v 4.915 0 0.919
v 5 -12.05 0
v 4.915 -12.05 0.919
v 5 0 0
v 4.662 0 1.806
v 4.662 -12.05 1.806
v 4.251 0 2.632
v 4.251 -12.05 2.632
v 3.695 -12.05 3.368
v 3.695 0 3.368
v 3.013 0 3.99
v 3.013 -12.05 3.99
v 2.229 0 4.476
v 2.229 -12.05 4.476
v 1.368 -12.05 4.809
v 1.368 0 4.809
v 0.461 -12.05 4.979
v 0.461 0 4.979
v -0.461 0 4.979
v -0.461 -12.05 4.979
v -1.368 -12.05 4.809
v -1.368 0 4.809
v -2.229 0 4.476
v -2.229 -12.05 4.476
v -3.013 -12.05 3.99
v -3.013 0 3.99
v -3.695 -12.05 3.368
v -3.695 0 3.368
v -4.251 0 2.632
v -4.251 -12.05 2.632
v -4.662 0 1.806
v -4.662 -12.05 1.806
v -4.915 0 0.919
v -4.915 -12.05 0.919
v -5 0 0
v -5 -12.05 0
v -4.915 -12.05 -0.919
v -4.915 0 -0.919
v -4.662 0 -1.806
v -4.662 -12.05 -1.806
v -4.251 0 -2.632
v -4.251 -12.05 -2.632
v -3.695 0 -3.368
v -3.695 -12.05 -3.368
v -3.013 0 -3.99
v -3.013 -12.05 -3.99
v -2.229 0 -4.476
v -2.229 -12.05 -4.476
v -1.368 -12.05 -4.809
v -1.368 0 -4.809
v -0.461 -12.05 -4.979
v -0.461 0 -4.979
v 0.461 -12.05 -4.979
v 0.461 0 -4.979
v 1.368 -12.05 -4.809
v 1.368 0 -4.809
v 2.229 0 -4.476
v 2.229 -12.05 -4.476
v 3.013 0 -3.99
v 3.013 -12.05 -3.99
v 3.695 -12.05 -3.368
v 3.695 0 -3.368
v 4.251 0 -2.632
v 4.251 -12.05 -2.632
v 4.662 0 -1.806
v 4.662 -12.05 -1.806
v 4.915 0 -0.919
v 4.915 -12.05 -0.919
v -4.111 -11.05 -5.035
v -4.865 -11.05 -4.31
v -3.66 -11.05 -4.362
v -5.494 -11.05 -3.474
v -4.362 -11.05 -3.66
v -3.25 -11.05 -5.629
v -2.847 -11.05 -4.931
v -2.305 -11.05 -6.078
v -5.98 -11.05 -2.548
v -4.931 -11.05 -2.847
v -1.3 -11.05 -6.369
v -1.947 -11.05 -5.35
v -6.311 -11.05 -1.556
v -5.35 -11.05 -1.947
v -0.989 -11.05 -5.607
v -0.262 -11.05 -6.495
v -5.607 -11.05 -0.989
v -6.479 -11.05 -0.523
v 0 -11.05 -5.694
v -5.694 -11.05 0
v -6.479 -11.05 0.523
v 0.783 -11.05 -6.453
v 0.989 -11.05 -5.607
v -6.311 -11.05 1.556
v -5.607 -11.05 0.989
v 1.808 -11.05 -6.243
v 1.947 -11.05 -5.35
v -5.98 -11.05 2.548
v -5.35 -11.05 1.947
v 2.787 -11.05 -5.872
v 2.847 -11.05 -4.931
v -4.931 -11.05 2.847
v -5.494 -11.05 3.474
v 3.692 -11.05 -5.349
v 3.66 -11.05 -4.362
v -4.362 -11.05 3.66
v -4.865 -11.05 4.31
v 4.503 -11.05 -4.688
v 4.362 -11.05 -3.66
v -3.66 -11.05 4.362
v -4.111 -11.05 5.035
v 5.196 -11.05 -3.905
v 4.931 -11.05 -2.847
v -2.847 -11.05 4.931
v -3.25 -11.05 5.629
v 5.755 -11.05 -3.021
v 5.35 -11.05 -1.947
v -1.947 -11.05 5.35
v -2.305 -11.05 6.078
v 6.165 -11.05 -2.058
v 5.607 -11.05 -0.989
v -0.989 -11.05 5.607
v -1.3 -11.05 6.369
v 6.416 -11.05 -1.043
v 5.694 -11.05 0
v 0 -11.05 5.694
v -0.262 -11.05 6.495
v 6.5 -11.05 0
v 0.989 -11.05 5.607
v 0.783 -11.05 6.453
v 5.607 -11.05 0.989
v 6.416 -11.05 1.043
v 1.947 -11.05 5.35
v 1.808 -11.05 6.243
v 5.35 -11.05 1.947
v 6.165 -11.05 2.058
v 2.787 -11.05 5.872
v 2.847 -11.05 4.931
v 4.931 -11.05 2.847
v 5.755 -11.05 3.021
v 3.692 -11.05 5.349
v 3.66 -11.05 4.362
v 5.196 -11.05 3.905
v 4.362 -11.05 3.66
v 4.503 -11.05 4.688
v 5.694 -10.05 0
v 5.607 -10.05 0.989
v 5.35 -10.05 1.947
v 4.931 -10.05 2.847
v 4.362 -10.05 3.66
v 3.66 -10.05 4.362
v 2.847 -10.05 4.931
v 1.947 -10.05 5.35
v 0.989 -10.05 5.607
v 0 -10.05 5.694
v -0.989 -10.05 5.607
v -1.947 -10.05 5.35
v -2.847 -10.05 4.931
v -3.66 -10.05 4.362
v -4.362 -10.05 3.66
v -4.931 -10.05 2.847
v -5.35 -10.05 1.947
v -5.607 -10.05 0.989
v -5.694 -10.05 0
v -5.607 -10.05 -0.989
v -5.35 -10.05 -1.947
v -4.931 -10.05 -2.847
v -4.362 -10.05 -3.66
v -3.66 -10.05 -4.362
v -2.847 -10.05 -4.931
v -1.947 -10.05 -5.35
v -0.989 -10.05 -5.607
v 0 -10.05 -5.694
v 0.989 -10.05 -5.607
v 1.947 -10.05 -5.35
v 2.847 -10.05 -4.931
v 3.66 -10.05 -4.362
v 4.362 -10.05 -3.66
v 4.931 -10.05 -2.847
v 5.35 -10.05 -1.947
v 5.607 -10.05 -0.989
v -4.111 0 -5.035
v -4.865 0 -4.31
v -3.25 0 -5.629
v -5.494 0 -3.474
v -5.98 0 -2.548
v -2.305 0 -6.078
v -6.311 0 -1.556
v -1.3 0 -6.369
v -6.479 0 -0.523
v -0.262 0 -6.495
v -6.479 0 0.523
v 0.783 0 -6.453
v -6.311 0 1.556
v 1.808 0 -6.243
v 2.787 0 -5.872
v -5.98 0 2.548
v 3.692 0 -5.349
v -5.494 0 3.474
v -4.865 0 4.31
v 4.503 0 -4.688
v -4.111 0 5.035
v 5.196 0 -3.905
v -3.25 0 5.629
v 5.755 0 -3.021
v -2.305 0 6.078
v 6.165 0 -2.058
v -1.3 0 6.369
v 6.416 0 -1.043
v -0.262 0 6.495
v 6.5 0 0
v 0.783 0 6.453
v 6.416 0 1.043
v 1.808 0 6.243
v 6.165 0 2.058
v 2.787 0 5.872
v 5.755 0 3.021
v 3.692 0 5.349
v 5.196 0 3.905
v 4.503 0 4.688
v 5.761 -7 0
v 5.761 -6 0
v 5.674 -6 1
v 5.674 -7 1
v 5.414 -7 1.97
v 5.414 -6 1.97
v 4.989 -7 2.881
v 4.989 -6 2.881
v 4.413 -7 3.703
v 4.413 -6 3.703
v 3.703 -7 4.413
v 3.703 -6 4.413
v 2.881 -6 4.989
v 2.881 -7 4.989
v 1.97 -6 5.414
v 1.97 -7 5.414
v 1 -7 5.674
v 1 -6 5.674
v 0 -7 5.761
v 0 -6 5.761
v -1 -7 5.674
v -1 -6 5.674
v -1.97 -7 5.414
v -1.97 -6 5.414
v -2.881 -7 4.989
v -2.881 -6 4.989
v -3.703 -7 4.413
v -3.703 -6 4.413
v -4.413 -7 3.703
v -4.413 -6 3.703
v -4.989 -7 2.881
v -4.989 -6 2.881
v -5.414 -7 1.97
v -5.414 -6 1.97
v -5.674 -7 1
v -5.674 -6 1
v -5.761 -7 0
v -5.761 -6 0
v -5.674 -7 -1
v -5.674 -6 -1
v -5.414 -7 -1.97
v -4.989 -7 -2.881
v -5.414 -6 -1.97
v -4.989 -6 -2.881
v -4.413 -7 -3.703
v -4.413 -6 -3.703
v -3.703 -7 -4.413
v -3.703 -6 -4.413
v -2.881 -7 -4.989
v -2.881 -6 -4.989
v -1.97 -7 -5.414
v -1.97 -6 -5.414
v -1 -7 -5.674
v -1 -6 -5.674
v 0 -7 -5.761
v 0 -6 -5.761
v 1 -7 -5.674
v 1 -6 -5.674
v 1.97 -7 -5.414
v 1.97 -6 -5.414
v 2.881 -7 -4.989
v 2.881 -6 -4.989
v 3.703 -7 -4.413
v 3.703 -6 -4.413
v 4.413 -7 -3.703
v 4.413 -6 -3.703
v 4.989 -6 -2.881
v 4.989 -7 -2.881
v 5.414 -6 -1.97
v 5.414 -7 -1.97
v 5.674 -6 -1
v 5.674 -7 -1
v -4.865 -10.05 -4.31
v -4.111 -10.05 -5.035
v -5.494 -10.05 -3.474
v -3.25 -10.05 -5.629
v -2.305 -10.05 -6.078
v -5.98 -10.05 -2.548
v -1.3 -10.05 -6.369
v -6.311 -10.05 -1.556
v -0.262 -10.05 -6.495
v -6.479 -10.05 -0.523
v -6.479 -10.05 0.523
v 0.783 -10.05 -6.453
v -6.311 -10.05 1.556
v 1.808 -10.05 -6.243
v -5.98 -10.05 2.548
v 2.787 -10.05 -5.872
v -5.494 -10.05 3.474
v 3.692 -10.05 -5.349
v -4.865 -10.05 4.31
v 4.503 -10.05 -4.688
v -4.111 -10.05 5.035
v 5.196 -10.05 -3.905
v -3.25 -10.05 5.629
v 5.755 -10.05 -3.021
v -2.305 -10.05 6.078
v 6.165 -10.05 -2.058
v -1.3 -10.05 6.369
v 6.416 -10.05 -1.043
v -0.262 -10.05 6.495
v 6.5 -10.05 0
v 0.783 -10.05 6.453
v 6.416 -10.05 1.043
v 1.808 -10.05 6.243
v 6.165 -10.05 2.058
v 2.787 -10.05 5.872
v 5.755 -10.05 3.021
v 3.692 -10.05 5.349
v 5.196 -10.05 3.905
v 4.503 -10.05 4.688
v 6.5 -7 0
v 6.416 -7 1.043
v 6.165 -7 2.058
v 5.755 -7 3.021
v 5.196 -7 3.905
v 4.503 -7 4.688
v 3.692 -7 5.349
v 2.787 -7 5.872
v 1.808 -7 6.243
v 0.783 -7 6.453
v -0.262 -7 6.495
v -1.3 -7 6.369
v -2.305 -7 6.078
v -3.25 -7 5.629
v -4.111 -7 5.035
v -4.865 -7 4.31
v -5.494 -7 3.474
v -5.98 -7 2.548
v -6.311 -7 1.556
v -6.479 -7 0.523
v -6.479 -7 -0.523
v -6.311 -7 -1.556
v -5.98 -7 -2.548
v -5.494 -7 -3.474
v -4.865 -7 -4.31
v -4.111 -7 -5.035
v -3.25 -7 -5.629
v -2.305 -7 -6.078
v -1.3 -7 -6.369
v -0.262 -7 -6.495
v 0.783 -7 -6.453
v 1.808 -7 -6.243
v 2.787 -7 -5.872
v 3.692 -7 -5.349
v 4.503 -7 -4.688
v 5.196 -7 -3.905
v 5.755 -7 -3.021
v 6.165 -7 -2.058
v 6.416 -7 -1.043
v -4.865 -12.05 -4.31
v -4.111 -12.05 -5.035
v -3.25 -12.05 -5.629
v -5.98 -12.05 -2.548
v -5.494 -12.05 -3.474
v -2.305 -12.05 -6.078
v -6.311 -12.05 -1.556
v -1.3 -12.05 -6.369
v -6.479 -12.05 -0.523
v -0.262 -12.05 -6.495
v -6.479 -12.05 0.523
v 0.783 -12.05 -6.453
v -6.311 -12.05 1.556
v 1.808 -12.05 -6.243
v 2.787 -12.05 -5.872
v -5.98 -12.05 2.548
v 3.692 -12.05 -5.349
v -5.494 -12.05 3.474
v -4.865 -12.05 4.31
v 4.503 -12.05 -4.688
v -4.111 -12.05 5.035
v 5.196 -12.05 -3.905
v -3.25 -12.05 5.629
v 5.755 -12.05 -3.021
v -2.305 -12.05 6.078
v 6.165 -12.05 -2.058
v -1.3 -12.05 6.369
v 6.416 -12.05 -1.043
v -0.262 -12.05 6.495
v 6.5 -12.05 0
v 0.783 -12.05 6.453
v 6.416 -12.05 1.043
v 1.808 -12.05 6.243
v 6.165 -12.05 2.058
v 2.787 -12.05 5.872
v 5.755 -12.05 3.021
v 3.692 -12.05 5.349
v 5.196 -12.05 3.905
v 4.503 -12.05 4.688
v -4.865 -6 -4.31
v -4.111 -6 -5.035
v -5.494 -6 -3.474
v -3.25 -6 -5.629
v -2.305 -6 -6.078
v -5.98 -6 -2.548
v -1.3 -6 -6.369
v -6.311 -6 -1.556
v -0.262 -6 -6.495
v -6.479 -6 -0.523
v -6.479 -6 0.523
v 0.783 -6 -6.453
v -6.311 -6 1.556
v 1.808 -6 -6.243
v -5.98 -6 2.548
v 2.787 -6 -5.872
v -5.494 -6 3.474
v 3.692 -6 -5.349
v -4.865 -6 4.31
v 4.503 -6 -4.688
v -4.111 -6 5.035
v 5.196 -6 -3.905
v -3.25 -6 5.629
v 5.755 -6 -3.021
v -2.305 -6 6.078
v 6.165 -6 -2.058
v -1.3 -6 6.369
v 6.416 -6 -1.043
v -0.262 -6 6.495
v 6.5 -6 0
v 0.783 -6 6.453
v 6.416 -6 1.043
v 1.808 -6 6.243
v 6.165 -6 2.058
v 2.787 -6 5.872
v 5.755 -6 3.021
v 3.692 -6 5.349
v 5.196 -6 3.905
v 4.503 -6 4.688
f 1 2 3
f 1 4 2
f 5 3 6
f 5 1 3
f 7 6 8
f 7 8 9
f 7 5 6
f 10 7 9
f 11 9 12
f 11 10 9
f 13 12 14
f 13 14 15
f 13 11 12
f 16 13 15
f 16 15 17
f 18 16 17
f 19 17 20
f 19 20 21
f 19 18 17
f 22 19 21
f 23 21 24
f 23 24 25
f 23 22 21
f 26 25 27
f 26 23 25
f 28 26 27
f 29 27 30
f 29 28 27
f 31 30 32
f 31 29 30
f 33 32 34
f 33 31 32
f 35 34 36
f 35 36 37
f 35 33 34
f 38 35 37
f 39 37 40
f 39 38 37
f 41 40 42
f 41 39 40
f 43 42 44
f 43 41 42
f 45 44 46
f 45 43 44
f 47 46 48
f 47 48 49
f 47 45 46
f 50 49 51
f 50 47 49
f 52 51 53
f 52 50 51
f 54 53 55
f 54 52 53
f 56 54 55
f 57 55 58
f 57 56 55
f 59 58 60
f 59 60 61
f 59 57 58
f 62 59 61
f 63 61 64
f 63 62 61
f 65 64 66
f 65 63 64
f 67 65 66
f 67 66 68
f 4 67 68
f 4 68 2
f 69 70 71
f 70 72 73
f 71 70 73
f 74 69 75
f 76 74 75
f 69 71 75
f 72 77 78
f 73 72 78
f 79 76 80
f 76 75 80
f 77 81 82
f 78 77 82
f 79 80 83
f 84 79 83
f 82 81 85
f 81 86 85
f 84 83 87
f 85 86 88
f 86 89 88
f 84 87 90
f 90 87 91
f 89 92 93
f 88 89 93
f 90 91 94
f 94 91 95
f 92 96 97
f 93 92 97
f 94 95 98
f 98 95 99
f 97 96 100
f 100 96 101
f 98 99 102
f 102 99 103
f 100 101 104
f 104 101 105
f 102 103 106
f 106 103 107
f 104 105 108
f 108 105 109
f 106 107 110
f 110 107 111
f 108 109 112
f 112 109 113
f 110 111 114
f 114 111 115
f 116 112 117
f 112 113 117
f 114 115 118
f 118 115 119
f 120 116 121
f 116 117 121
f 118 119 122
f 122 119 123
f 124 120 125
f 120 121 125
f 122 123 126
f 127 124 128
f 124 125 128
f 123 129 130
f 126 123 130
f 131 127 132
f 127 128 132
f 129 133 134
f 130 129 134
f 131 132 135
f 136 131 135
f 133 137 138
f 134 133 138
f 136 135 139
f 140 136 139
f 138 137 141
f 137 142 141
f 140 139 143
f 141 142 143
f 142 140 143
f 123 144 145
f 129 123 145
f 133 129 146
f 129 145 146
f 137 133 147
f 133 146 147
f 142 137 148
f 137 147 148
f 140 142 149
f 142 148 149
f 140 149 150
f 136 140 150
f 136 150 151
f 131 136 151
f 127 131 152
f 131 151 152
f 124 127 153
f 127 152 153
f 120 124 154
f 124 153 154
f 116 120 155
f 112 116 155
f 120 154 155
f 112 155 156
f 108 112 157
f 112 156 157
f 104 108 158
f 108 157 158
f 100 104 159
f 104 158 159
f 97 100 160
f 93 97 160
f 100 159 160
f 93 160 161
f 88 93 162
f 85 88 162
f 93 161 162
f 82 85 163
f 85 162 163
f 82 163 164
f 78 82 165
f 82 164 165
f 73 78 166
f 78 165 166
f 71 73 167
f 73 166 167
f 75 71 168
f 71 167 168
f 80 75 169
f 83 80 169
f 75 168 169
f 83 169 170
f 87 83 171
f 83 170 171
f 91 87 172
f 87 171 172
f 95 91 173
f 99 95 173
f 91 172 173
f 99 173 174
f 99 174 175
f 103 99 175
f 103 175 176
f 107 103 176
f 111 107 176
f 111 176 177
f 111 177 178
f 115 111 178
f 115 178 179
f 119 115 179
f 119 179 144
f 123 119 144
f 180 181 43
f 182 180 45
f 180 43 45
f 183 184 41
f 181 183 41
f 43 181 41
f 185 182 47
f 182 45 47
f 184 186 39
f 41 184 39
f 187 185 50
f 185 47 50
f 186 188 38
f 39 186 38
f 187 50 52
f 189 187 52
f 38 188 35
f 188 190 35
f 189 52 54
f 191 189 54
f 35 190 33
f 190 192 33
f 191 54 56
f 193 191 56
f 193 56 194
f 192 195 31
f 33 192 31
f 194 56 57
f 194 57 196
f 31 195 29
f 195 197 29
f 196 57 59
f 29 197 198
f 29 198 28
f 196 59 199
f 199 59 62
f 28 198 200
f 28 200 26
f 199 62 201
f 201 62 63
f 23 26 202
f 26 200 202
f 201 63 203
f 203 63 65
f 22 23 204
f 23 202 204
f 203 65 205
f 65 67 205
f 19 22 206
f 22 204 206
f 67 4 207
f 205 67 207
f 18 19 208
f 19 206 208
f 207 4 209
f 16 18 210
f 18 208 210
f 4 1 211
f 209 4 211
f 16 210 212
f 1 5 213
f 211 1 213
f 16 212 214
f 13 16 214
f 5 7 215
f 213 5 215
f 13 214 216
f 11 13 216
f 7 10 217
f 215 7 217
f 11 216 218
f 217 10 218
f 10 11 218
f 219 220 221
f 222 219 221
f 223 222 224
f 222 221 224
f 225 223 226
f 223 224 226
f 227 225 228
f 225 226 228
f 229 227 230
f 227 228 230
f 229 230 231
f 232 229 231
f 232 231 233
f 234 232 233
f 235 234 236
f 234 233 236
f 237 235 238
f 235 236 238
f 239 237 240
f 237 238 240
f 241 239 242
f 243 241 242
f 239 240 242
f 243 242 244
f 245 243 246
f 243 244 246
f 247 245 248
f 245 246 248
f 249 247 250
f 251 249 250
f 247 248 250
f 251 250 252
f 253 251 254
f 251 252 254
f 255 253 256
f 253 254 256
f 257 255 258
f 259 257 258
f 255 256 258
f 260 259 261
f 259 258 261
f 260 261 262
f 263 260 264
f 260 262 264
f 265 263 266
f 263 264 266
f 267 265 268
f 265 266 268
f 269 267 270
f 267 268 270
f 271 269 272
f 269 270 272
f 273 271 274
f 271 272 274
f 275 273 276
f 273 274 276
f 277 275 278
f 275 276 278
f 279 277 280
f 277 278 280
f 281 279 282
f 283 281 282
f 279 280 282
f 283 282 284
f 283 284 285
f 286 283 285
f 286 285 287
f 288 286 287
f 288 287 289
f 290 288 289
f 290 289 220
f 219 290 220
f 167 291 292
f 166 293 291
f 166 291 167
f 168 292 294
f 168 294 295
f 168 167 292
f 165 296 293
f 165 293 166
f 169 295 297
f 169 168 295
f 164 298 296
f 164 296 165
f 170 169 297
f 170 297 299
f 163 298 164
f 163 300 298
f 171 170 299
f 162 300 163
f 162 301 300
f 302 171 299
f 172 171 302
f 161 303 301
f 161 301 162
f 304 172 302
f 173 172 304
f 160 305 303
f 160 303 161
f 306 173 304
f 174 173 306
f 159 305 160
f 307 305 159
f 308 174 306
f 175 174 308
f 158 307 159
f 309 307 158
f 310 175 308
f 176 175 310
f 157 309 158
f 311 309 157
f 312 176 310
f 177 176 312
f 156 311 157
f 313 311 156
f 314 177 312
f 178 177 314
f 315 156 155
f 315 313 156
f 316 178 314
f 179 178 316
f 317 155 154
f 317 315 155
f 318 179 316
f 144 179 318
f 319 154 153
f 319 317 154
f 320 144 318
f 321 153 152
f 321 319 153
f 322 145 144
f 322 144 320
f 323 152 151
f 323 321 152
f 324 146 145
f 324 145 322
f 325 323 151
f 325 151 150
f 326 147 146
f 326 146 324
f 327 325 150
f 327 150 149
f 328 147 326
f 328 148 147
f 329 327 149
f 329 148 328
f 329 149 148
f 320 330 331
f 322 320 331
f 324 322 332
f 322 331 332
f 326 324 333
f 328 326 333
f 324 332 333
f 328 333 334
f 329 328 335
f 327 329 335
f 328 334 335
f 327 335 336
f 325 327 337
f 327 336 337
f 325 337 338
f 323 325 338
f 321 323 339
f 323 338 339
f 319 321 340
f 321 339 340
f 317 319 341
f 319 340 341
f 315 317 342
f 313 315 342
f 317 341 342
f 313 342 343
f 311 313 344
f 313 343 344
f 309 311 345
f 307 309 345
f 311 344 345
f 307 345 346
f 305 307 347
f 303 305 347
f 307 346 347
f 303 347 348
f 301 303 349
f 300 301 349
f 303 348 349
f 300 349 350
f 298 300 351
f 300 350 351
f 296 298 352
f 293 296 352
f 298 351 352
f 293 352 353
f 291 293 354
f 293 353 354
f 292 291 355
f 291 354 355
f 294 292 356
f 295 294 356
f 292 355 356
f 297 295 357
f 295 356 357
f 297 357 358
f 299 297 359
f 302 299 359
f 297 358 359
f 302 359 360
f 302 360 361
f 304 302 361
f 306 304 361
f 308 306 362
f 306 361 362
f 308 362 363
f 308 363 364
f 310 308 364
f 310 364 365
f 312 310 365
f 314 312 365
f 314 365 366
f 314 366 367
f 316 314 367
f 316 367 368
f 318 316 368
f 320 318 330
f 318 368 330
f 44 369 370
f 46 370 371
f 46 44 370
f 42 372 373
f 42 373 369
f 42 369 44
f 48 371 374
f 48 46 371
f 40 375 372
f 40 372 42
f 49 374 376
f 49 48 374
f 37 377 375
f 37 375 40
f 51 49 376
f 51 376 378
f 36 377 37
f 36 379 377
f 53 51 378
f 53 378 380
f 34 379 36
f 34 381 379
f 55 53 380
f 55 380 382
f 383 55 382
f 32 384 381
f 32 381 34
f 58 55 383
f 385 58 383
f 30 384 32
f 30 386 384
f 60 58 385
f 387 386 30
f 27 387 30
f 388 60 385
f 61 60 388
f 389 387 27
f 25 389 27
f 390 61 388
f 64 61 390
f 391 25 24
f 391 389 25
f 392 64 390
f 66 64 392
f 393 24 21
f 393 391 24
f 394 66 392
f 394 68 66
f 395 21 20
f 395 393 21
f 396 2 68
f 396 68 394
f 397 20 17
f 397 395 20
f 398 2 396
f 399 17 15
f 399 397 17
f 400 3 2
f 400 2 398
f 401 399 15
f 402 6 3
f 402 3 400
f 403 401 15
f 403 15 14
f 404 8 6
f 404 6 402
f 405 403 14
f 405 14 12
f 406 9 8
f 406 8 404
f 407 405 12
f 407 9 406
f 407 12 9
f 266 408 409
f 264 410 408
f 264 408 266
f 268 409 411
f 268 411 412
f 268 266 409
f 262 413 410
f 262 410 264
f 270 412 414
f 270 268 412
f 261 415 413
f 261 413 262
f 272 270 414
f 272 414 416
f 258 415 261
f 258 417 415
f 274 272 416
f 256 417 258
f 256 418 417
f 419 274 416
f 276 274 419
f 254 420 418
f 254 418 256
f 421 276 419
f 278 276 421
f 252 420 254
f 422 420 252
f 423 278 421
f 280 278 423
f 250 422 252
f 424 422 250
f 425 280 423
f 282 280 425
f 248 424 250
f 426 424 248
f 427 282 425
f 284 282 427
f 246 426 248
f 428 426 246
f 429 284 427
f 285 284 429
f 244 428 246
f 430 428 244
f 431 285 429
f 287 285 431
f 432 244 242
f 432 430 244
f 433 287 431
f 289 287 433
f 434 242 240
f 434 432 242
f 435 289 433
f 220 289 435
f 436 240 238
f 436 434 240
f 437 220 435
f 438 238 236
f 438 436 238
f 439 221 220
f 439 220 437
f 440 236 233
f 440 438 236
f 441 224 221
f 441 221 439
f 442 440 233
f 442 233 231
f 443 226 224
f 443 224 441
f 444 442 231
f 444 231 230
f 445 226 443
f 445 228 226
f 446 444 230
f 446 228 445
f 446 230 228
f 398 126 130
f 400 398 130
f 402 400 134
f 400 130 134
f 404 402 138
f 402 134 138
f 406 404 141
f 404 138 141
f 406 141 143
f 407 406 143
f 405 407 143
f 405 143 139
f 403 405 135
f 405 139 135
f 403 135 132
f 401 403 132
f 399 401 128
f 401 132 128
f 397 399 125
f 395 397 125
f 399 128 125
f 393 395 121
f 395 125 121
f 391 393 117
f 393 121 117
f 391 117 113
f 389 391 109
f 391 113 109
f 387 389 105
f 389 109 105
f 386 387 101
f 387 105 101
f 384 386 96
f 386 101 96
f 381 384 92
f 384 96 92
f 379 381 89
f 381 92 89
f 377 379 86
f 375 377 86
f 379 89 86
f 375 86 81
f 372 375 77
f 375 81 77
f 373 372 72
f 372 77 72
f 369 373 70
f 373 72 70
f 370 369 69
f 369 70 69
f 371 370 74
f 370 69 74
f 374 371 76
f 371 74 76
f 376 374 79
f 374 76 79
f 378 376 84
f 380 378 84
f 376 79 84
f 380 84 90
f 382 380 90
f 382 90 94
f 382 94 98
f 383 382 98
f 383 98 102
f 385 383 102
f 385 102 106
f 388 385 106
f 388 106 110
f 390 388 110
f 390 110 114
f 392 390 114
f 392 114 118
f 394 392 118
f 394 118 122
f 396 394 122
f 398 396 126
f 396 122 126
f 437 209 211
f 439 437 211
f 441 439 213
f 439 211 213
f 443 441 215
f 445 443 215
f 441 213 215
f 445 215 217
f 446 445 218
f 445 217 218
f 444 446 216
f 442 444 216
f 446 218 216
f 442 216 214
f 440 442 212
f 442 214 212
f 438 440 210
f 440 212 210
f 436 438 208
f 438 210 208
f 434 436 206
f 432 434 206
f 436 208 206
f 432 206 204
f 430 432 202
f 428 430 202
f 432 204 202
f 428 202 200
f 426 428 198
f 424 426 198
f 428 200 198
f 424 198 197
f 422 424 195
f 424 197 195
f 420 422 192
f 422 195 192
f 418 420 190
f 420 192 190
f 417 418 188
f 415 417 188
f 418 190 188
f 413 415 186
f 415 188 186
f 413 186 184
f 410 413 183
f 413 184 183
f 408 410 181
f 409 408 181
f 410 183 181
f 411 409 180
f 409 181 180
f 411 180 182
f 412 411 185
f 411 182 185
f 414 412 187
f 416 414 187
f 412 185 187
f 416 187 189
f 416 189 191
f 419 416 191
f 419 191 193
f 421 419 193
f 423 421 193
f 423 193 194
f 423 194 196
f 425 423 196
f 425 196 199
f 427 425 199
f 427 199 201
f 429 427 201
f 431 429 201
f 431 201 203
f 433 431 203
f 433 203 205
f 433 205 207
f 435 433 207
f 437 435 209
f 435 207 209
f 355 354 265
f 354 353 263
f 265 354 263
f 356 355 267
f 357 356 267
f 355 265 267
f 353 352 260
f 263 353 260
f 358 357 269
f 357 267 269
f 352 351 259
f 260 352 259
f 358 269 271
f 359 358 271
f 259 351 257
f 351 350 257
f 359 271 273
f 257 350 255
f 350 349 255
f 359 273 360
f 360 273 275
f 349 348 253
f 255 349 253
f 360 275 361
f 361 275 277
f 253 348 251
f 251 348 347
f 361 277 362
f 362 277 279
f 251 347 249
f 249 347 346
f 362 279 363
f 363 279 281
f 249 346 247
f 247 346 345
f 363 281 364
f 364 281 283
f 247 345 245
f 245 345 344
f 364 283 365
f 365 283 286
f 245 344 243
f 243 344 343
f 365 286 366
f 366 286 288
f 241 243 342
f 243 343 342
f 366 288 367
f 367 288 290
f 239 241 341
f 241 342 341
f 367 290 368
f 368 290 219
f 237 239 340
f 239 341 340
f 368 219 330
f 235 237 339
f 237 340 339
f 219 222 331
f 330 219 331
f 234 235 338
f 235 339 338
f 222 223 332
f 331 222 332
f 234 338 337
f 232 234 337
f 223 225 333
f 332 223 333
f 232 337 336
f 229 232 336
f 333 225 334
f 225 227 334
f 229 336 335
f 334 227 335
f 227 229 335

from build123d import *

# Parameters (mm, degrees)
F0_R     = 6.5
F0_R_2   = 5
F1_DEPTH = 6
F2_R     = 5.761046585
F2_R_2   = 5
F3_DEPTH = 1
F4_R     = 6.5
F4_R_2   = 5
F5_DEPTH = 3.05
F6_R     = 5.693586081
F6_R_2   = 5
F7_DEPTH = 1
F8_R     = 6.5
F8_R_2   = 5
F9_DEPTH = 1


with BuildPart() as f1:
    # F0 (on Front) → F1 (new body)
    with BuildSketch(Plane.XZ):
        Circle(F0_R)
        Circle(F0_R_2, mode=Mode.SUBTRACT)
    extrude(amount=F1_DEPTH)

    # F2 (on face) → F3 (join)
    with BuildSketch(Plane.XZ.offset(6)):
        Circle(F2_R)
        Circle(F2_R_2, mode=Mode.SUBTRACT)
    extrude(amount=F3_DEPTH)

    # F4 (on face) → F5 (join)
    with BuildSketch(Plane.XZ.offset(7)):
        Circle(F4_R)
        Circle(F4_R_2, mode=Mode.SUBTRACT)
    extrude(amount=F5_DEPTH)

    # F6 (on face) → F7 (join)
    with BuildSketch(Plane.XZ.offset(10.05)):
        Circle(F6_R)
        Circle(F6_R_2, mode=Mode.SUBTRACT)
    extrude(amount=F7_DEPTH)

    # F8 (on face) → F9 (join)
    with BuildSketch(Plane.XZ.offset(11.05)):
        Circle(F8_R)
        Circle(F8_R_2, mode=Mode.SUBTRACT)
    extrude(amount=F9_DEPTH)


solid = f1.part
